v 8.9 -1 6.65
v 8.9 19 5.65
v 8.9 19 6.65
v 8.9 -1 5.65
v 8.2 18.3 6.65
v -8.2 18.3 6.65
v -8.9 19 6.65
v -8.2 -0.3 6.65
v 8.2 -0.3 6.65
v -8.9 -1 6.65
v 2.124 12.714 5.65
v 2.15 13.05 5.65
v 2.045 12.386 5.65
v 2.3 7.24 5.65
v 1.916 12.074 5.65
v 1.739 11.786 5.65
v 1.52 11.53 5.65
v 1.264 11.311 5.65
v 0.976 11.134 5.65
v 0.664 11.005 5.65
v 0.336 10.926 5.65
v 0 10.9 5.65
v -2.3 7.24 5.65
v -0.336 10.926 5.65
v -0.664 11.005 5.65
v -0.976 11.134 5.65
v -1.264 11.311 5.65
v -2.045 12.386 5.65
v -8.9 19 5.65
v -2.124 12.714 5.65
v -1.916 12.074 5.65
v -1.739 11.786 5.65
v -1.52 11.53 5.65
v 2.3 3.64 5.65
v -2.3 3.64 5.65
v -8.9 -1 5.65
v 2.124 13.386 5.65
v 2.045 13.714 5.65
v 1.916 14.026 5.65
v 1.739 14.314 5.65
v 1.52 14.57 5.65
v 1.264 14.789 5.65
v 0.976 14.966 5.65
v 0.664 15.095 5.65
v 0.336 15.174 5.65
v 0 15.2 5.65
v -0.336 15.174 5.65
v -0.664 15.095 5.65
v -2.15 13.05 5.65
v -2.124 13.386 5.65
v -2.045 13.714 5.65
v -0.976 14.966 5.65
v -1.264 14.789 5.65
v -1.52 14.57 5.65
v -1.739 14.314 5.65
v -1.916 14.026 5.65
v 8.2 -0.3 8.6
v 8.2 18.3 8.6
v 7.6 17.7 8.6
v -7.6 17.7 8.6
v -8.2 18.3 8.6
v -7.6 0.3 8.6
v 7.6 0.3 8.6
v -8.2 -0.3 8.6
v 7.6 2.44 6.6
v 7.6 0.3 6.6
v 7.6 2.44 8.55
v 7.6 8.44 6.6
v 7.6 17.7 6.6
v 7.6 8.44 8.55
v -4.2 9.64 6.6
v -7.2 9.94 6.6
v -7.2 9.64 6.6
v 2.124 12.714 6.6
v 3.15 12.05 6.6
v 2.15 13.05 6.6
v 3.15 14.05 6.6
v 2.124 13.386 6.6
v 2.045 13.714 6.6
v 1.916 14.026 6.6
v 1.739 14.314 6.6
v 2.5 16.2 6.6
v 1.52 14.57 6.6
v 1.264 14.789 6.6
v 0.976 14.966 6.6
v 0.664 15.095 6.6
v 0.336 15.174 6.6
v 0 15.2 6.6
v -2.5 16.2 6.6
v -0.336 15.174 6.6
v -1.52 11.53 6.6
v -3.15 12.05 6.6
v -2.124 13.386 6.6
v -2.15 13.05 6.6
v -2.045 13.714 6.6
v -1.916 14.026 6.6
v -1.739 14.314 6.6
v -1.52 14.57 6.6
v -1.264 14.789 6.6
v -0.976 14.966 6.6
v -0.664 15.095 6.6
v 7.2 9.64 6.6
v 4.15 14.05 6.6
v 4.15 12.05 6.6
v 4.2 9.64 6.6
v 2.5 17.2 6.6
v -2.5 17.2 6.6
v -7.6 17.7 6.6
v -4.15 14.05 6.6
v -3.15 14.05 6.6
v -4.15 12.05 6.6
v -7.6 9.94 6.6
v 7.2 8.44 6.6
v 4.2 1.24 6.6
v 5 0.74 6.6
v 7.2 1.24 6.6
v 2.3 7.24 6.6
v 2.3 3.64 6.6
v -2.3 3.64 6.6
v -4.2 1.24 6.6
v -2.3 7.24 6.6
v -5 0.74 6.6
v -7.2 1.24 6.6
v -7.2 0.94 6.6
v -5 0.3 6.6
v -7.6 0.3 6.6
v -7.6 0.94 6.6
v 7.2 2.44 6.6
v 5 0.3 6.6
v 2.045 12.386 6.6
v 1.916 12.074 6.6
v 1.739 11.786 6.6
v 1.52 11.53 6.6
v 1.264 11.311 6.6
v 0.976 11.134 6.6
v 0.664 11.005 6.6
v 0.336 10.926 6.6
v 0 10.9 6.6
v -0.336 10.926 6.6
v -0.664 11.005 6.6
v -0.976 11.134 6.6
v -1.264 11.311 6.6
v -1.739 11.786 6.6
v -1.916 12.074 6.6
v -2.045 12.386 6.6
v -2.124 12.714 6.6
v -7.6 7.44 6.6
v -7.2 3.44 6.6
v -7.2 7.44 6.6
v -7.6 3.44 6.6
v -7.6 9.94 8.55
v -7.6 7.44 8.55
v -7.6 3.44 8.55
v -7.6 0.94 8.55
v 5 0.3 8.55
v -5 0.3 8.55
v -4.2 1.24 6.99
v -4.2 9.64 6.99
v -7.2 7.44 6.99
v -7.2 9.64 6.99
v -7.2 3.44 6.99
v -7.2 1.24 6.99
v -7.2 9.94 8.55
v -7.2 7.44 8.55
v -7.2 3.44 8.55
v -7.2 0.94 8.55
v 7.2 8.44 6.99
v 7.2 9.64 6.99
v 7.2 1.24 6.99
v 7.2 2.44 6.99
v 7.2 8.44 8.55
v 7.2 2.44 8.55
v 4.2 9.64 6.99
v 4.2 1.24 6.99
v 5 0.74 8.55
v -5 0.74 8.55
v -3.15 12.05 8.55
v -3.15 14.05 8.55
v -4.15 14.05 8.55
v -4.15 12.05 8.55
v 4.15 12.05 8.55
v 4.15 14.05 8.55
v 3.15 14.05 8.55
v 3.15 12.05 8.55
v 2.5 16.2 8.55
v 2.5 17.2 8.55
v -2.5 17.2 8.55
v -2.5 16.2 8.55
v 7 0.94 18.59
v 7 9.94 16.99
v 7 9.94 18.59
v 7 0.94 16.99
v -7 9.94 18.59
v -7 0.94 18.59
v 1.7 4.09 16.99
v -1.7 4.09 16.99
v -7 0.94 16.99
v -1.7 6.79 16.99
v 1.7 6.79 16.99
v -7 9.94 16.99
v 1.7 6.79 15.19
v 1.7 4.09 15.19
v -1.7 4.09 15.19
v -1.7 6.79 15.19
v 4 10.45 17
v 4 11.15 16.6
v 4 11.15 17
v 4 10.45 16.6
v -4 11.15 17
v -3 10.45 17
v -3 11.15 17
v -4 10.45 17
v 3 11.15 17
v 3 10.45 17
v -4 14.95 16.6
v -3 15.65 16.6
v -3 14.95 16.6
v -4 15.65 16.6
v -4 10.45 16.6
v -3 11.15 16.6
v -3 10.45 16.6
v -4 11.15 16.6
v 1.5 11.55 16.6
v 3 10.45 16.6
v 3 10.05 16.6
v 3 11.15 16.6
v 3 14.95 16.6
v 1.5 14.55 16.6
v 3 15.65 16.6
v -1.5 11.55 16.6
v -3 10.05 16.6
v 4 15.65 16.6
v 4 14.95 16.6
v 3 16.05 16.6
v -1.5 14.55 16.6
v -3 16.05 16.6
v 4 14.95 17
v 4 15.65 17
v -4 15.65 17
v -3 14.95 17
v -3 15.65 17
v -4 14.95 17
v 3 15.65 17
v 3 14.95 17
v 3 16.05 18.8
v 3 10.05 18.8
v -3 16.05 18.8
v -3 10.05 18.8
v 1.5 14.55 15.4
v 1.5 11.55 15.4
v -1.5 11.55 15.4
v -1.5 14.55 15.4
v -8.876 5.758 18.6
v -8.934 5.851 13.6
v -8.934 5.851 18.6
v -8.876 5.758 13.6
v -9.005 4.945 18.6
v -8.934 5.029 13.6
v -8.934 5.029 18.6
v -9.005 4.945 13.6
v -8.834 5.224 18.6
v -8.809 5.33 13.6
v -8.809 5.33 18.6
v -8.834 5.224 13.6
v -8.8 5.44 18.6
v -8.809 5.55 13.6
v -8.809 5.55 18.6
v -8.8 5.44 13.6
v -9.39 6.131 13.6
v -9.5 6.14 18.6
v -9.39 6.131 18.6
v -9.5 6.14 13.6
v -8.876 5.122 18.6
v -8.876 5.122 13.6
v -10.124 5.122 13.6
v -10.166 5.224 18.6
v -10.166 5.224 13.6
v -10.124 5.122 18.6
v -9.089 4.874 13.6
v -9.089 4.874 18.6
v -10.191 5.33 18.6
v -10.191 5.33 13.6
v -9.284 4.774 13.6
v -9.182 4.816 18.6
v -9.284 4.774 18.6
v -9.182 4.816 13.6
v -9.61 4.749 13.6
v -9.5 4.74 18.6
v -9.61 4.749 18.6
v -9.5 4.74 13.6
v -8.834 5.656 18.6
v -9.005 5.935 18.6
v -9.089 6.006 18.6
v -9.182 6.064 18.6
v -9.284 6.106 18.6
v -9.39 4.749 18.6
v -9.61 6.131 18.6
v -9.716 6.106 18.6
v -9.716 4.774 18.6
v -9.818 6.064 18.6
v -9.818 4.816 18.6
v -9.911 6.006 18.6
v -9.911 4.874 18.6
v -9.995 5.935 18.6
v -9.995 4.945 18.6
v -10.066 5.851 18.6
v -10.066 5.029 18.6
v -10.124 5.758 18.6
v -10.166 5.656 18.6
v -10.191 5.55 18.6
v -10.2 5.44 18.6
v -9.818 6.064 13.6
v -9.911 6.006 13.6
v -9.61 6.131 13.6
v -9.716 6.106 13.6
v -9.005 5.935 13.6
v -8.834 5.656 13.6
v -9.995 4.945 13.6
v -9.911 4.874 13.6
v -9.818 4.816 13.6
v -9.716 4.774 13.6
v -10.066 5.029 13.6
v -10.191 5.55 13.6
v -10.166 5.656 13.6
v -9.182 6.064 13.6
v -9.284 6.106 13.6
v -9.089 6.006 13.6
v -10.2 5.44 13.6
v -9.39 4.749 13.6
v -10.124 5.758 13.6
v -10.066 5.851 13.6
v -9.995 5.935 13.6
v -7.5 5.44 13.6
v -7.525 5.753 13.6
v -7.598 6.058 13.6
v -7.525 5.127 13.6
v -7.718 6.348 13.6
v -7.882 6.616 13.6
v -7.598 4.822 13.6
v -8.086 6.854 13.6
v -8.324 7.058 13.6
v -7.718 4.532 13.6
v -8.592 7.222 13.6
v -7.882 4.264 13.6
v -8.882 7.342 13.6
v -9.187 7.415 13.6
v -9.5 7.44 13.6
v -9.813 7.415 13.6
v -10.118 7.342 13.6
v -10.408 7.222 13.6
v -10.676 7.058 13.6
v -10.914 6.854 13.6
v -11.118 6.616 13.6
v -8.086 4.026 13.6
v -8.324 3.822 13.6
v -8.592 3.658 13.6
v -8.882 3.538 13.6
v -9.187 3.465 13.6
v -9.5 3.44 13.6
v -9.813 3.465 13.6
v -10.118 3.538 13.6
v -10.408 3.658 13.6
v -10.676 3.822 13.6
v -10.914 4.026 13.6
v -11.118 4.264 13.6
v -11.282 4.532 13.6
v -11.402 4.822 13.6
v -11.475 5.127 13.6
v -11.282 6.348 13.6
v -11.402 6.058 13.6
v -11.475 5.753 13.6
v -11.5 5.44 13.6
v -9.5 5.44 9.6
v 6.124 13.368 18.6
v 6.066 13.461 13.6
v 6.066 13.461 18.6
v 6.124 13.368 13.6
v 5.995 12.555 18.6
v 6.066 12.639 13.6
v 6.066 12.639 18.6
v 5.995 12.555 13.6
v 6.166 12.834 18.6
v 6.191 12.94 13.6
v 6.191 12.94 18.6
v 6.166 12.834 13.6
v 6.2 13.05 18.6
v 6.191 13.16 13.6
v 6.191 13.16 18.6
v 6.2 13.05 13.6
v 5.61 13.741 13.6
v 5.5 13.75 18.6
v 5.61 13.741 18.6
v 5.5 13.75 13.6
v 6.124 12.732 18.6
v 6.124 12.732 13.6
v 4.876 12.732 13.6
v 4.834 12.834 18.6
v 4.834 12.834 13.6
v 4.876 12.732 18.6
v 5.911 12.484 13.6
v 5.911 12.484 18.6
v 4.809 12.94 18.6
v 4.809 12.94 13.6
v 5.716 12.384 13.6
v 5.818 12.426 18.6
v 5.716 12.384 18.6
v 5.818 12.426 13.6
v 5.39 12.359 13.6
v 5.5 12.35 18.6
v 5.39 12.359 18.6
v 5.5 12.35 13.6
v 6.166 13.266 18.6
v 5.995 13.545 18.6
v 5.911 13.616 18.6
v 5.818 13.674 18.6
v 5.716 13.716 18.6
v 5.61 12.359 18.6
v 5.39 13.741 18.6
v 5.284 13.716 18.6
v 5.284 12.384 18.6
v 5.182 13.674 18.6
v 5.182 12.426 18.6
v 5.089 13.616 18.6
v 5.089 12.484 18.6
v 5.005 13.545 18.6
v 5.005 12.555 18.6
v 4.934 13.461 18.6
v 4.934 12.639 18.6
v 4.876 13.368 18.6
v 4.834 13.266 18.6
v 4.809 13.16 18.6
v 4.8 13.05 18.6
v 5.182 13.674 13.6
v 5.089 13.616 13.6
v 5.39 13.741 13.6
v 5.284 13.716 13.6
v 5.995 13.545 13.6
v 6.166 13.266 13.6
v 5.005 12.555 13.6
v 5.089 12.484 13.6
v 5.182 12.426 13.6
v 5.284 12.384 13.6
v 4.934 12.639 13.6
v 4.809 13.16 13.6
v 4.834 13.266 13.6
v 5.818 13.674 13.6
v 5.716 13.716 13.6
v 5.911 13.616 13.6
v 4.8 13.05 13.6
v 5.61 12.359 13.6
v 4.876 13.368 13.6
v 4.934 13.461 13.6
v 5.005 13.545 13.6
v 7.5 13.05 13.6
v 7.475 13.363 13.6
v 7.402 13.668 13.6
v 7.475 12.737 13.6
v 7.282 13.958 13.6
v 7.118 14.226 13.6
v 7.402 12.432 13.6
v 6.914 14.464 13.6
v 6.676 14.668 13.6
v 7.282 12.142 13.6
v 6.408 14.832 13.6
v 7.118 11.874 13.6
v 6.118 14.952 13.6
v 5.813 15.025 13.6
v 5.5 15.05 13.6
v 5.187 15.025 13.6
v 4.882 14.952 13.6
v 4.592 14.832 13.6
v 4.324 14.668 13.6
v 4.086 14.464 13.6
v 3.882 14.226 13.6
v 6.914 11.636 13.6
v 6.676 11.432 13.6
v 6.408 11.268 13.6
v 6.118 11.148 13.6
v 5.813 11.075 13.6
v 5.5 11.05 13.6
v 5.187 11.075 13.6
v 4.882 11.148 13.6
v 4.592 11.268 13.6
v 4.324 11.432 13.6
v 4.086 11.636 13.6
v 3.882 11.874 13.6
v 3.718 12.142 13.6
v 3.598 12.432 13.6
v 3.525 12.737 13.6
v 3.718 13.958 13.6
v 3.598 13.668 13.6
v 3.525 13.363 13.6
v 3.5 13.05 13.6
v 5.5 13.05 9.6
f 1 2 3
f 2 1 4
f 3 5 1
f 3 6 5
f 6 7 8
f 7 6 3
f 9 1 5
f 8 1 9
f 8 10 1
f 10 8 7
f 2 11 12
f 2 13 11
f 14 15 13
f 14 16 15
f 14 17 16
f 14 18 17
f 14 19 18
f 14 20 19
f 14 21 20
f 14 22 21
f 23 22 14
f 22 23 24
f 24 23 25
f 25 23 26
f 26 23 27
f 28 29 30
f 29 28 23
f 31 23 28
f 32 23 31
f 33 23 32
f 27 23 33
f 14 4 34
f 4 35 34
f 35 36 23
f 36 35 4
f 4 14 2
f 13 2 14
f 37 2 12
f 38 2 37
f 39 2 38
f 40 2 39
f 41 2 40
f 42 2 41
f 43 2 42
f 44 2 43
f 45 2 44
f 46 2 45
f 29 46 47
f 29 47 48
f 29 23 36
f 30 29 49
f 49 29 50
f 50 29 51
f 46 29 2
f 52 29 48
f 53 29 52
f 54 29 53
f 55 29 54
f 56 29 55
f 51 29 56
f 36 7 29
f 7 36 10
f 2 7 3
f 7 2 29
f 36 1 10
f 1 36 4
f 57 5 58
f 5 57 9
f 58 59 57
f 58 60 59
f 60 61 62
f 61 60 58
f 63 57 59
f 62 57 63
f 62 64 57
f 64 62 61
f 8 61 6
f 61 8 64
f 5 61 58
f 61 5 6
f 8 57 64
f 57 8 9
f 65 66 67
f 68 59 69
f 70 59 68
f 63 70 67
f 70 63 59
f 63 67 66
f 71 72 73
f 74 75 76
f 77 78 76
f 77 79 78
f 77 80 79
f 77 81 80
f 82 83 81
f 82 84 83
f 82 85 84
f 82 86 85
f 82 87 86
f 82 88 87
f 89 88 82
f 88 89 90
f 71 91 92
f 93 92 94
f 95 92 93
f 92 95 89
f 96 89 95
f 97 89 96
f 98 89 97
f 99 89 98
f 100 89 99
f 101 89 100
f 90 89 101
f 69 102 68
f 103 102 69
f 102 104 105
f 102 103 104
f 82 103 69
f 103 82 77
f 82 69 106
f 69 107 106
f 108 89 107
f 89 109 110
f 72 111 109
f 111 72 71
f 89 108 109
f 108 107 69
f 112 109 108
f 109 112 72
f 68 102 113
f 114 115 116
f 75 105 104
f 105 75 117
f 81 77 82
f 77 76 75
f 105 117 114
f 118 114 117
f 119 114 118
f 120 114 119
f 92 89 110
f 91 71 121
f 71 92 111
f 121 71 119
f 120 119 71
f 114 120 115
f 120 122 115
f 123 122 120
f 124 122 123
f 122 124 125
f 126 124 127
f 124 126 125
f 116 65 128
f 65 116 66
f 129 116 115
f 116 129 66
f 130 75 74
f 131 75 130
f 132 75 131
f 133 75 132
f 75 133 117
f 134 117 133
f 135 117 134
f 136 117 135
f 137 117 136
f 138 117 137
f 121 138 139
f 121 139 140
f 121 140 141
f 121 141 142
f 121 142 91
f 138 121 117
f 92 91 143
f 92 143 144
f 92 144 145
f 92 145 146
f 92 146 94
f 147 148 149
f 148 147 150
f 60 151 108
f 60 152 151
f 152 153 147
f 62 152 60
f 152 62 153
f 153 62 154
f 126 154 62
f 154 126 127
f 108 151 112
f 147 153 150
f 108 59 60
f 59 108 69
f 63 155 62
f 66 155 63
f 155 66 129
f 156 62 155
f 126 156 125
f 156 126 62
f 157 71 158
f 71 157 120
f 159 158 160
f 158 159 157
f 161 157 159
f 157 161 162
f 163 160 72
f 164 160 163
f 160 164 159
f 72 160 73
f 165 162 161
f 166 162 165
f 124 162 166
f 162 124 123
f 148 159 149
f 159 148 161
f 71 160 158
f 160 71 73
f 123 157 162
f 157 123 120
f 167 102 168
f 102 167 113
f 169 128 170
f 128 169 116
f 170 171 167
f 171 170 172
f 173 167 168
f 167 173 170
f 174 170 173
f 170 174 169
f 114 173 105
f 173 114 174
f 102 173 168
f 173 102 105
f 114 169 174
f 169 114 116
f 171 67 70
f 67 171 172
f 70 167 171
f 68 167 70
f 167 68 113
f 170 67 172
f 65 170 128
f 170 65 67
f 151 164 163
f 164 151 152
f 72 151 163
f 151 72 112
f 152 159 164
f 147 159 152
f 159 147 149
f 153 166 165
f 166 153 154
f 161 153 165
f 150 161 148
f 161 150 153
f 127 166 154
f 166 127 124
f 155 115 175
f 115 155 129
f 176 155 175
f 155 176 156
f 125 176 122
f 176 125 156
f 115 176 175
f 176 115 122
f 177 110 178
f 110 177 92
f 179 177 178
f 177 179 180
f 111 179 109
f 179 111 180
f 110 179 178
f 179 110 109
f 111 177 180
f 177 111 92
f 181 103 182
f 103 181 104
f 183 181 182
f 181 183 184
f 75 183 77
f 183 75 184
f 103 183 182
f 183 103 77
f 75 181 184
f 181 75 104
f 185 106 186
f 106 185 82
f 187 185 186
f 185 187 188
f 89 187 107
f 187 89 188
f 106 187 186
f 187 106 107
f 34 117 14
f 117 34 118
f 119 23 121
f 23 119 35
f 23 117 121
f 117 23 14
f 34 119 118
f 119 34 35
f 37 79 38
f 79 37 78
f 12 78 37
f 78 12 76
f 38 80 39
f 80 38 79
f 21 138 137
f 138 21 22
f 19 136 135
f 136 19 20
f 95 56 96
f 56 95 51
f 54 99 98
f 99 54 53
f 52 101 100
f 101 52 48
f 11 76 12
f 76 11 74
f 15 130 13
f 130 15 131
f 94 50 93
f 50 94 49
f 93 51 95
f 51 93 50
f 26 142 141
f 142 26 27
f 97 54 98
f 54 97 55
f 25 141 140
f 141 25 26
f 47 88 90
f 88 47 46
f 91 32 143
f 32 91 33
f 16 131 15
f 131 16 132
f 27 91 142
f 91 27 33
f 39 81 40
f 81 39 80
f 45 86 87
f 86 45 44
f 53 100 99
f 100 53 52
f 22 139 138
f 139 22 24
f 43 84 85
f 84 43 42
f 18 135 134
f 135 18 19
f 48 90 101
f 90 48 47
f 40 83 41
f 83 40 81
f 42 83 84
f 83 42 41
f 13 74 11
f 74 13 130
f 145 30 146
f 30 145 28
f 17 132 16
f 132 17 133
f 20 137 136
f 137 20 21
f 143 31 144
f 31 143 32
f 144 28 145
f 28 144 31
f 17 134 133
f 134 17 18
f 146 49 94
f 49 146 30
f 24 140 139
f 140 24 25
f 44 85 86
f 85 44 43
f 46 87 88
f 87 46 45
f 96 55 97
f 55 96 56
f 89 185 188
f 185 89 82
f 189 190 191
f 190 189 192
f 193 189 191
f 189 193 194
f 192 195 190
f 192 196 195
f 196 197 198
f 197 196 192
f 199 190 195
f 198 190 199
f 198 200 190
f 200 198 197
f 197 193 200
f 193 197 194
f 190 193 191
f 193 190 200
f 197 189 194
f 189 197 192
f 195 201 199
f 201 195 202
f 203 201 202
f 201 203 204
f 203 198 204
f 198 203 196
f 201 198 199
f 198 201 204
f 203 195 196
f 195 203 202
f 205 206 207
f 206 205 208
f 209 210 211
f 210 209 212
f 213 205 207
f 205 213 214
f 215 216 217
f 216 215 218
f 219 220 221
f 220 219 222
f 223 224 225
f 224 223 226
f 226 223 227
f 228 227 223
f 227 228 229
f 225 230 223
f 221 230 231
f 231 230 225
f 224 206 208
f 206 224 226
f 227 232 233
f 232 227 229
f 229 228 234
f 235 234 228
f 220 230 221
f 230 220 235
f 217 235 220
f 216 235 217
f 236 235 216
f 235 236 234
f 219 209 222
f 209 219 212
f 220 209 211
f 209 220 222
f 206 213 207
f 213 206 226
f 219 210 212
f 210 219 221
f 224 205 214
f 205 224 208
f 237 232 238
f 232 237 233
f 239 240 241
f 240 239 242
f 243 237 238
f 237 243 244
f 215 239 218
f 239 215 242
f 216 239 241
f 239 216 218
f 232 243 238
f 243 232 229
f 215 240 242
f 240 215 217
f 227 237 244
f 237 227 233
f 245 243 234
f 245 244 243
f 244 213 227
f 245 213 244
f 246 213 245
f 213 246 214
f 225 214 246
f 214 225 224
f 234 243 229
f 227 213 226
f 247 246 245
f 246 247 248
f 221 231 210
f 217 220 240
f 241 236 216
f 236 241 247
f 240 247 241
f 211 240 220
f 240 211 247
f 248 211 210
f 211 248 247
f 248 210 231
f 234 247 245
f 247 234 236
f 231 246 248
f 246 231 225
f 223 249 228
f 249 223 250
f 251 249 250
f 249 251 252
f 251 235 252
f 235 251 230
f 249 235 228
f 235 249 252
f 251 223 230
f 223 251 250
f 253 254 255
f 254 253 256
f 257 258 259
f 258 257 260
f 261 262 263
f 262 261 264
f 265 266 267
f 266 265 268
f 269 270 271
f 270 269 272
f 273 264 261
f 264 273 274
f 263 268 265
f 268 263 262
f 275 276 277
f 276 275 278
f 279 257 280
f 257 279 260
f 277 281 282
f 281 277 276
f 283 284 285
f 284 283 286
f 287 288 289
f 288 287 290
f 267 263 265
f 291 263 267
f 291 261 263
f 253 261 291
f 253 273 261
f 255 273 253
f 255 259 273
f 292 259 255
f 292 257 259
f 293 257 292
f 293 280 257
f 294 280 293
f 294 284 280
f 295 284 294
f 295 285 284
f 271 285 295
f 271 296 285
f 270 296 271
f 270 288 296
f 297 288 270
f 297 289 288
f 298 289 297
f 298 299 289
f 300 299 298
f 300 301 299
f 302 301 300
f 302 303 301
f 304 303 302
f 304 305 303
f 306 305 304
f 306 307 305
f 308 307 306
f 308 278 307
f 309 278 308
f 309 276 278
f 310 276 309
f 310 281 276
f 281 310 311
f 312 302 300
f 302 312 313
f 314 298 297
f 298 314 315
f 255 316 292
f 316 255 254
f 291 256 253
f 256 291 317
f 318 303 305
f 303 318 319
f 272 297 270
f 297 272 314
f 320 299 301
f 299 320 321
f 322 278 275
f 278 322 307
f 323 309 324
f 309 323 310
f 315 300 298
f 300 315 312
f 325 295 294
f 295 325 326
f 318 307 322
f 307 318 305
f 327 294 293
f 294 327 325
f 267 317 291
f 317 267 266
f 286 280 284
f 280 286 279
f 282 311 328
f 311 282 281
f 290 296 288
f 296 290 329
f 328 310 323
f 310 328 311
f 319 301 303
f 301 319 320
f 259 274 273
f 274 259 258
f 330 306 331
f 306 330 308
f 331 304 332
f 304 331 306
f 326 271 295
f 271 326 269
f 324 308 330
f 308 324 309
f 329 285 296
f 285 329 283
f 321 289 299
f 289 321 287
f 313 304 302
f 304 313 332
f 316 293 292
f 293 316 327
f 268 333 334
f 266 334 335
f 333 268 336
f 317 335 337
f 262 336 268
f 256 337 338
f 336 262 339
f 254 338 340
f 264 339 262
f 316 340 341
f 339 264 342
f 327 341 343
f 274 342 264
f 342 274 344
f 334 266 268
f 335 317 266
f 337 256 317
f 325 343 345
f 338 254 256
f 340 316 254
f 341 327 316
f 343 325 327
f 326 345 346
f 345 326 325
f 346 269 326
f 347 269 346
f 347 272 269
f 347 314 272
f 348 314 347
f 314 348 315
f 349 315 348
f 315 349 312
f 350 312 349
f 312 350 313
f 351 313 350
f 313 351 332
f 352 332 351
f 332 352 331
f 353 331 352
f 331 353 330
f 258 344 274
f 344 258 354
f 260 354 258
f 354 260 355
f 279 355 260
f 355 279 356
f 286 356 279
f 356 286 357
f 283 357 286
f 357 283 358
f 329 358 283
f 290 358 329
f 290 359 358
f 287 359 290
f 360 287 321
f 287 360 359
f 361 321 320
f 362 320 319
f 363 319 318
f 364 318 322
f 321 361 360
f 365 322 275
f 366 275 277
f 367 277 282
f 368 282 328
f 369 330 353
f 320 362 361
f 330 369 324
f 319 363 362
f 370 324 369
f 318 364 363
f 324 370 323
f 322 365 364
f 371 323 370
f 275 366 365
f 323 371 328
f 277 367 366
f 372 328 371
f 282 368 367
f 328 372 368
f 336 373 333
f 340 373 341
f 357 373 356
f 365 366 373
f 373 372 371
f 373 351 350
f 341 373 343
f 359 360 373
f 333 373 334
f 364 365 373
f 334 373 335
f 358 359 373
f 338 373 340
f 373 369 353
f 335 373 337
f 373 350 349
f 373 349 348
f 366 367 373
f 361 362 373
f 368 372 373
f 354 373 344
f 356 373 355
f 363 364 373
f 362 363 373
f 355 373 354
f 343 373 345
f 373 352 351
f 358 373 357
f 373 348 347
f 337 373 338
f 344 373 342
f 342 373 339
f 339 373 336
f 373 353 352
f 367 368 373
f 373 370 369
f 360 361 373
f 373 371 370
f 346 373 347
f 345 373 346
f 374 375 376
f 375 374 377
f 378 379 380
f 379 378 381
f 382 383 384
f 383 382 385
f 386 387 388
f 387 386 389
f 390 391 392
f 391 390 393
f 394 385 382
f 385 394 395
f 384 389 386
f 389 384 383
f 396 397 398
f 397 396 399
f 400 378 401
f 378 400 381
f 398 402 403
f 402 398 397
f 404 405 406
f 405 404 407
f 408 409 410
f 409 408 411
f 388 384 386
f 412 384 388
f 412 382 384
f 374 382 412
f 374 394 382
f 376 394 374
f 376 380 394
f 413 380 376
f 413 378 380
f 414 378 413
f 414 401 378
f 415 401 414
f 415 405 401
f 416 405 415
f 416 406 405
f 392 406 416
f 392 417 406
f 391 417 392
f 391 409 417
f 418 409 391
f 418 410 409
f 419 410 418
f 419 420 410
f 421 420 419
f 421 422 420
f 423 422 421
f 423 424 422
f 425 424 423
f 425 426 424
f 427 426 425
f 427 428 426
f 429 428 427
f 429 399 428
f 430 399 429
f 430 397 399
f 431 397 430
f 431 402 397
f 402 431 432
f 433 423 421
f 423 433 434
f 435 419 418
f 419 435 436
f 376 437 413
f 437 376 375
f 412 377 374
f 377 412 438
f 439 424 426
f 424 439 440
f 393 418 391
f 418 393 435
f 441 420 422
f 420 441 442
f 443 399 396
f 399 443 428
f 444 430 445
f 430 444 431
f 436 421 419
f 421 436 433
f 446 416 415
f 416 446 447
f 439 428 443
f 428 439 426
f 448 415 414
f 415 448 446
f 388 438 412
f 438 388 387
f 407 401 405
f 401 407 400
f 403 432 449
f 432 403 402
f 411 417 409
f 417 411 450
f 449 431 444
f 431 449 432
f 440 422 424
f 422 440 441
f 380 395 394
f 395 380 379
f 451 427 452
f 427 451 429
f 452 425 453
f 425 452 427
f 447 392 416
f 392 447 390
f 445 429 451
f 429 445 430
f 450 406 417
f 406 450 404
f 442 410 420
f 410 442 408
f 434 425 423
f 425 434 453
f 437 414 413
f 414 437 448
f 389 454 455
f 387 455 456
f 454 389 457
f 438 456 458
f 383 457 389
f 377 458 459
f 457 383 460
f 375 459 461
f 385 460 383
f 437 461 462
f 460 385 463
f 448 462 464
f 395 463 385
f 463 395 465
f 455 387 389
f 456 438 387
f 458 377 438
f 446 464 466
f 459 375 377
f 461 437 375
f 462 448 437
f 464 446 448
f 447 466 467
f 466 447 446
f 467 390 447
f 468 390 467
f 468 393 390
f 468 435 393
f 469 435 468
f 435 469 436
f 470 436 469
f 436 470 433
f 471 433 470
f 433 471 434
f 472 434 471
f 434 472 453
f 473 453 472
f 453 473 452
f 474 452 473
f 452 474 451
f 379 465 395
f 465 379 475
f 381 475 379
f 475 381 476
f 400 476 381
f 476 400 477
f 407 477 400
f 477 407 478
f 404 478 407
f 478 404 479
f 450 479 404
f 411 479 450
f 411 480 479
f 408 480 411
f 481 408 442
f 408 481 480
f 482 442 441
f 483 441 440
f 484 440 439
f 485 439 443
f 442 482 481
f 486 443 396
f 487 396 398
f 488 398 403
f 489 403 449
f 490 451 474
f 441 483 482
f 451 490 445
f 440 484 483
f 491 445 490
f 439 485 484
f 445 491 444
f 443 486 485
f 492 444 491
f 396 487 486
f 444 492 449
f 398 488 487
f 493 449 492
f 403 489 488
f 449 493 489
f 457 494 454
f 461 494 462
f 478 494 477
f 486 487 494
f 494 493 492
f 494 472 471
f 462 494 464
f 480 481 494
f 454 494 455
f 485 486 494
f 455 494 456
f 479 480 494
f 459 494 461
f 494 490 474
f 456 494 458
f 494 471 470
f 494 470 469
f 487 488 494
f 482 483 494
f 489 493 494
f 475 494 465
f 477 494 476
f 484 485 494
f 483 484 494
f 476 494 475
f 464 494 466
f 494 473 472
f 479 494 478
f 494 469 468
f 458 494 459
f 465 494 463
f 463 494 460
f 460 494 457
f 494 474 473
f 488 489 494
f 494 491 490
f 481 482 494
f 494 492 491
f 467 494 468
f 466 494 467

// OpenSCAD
// SpinLite - immagini di montaggio della scatola piatta, passo per passo.
// OpenSCAD, licenza MIT. In ogni passo i pezzi gia' montati stanno al loro posto,
// quello nuovo e' staccato e una freccia magenta dice dove entra.
// Rigenerare le immagini: python hardware/render/render_montaggio.py
include <spinlite_flat.scad>
part = "none";
step = 1;   // 1..9
$fn = 40;

C_BODY = "wheat";
C_LID  = "lightblue";
C_TRAY = "#3a3a3a";
C_CLIP = "lightslategray";

// freccia magenta lungo un asse: p = punta, d = verso in cui punta, l = lunghezza
module arrow(p, d, l = 10) {
    rot = d == [0, 0, 1] ? [0, 0, 0] : d == [0, 0, -1] ? [180, 0, 0] :
          d == [1, 0, 0] ? [0, 90, 0] : d == [-1, 0, 0] ? [0, -90, 0] :
          d == [0, 1, 0] ? [-90, 0, 0] : [90, 0, 0];
    color("magenta") translate(p) rotate(rot) translate([0, 0, -l]) {
        cylinder(d = 1.4, h = l - 4);
        translate([0, 0, l - 4]) cylinder(d1 = 4, d2 = 0, h = 4);
    }
}

module tray_set()  { color(C_TRAY) tray(); qre(); tact(); }
module lid_set()   { color(C_LID) lid(); oled_module(); button(); }
module switch_screws() color("silver")
    for (s = [-1, 1]) translate([19, sf_y + s * sf_pitch / 2, sf_z]) rotate([0, 90, 0]) {
        cylinder(d = 3.8, h = 1.3);
        translate([0, 0, -6]) cylinder(d = 2, h = 6);
    }
module lid_screws() color("silver") post_positions() translate([0, 0, z_top]) {
    cylinder(d = 3.8, h = 1.3);
    translate([0, 0, -6]) cylinder(d = 2, h = 6);
}
module clips() { color(C_CLIP) { mounted_clip(0, false); mounted_clip(0, true); } }

// ciascun passo mostra quello che c'e' gia' piu' il pezzo nuovo, staccato.
// Le frecce stanno di lato al pezzo, dalla posizione staccata a quella di montaggio.
if (step == 1) {                      // QRE1113 e tasto nel vassoio
    color(C_TRAY) tray();
    translate([0, 0, 10]) { qre(); tact(); }
    arrow([-9.5, sensor_y, tray_top + 1], [0, 0, -1], 9);
    arrow([5.5, button_y, tray_top + 1], [0, 0, -1], 9);
} else if (step == 2) {               // vassoio nel corpo, da sotto
    color(C_BODY) body();
    translate([0, 0, -16]) tray_set();
    arrow([11, 9, body_z - 0.5], [0, 0, 1], 12);
} else if (step == 3) {               // SuperMini di traverso, USB-C nel fianco -X
    color(C_BODY) body(); tray_set();
    translate([0, 0, 14]) supermini();
    arrow([-6, sm_y1 + 3, z_sm + 2], [0, 0, -1], 11);
} else if (step == 4) {               // interruttore sul fianco +X, viti da fuori
    color(C_BODY) body(); tray_set(); supermini();
    translate([0, 0, 14]) switch_sf();
    arrow([13, sf_y + 11, sf_z + 4], [0, 0, -1], 10);
    translate([8, 0, 0]) switch_screws();
    arrow([27, sf_y, sf_z + 4], [-1, 0, 0], 7);
} else if (step == 5) {               // TP4056 e LiPo
    color(C_BODY) body(); tray_set(); supermini(); switch_sf(); switch_screws();
    translate([0, 0, 12]) tp4056();
    arrow([-13, (tp_y0 + tp_y1) / 2, z_floor + 3], [0, 0, -1], 10);
    translate([0, 0, 18]) lipo_pack();
    arrow([-12.5, lipo_y0 + 15, z_floor + 7], [0, 0, -1], 12);
} else if (step == 6) {               // tasto esterno sulla torretta
    color(C_BODY) body(); tray_set(); supermini(); switch_sf(); switch_screws(); tp4056(); lipo_pack();
    translate([0, 0, 10]) btn_tact();
    arrow([btn_x + 5.5, btn_y, z_btn_tact + 4], [0, 0, -1], 9);
} else if (step == 7) {               // OLED e cappuccio nel coperchio (coperchio capovolto)
    translate([0, 0, 2 * z_top]) mirror([0, 0, 1]) {
        color(C_LID) lid();
        translate([0, 0, -12]) { oled_module(); button(); }
    }
    arrow([9, oled_y, z_top + 5], [0, 0, -1], 9);
    arrow([btn_x - 5, btn_y, z_top + 5], [0, 0, -1], 9);
} else if (step == 8) {               // clip sul blocco della cerniera
    color(C_BODY) body(); tray_set(); supermini(); switch_sf(); switch_screws(); tp4056(); lipo_pack(); btn_tact();
    translate([10, 0, 6]) color(C_CLIP) mounted_clip(0, false);
    translate([-10, 0, 6]) color(C_CLIP) mounted_clip(0, true);
    arrow([pivot[0] + 2, clip_y - 7, pivot[1] + 3], [-1, 0, 0], 9);
    arrow([-pivot[0] - 2, clip_y - 7, pivot[1] + 3], [1, 0, 0], 9);
} else if (step == 9) {               // coperchio e 9 viti
    color(C_BODY) body(); tray_set(); supermini(); switch_sf(); switch_screws(); tp4056(); lipo_pack(); btn_tact(); clips();
    translate([0, 0, 22]) { lid_set(); lid_screws(); }
    arrow([23, 40, z_top + 1], [0, 0, -1], 20);
}
